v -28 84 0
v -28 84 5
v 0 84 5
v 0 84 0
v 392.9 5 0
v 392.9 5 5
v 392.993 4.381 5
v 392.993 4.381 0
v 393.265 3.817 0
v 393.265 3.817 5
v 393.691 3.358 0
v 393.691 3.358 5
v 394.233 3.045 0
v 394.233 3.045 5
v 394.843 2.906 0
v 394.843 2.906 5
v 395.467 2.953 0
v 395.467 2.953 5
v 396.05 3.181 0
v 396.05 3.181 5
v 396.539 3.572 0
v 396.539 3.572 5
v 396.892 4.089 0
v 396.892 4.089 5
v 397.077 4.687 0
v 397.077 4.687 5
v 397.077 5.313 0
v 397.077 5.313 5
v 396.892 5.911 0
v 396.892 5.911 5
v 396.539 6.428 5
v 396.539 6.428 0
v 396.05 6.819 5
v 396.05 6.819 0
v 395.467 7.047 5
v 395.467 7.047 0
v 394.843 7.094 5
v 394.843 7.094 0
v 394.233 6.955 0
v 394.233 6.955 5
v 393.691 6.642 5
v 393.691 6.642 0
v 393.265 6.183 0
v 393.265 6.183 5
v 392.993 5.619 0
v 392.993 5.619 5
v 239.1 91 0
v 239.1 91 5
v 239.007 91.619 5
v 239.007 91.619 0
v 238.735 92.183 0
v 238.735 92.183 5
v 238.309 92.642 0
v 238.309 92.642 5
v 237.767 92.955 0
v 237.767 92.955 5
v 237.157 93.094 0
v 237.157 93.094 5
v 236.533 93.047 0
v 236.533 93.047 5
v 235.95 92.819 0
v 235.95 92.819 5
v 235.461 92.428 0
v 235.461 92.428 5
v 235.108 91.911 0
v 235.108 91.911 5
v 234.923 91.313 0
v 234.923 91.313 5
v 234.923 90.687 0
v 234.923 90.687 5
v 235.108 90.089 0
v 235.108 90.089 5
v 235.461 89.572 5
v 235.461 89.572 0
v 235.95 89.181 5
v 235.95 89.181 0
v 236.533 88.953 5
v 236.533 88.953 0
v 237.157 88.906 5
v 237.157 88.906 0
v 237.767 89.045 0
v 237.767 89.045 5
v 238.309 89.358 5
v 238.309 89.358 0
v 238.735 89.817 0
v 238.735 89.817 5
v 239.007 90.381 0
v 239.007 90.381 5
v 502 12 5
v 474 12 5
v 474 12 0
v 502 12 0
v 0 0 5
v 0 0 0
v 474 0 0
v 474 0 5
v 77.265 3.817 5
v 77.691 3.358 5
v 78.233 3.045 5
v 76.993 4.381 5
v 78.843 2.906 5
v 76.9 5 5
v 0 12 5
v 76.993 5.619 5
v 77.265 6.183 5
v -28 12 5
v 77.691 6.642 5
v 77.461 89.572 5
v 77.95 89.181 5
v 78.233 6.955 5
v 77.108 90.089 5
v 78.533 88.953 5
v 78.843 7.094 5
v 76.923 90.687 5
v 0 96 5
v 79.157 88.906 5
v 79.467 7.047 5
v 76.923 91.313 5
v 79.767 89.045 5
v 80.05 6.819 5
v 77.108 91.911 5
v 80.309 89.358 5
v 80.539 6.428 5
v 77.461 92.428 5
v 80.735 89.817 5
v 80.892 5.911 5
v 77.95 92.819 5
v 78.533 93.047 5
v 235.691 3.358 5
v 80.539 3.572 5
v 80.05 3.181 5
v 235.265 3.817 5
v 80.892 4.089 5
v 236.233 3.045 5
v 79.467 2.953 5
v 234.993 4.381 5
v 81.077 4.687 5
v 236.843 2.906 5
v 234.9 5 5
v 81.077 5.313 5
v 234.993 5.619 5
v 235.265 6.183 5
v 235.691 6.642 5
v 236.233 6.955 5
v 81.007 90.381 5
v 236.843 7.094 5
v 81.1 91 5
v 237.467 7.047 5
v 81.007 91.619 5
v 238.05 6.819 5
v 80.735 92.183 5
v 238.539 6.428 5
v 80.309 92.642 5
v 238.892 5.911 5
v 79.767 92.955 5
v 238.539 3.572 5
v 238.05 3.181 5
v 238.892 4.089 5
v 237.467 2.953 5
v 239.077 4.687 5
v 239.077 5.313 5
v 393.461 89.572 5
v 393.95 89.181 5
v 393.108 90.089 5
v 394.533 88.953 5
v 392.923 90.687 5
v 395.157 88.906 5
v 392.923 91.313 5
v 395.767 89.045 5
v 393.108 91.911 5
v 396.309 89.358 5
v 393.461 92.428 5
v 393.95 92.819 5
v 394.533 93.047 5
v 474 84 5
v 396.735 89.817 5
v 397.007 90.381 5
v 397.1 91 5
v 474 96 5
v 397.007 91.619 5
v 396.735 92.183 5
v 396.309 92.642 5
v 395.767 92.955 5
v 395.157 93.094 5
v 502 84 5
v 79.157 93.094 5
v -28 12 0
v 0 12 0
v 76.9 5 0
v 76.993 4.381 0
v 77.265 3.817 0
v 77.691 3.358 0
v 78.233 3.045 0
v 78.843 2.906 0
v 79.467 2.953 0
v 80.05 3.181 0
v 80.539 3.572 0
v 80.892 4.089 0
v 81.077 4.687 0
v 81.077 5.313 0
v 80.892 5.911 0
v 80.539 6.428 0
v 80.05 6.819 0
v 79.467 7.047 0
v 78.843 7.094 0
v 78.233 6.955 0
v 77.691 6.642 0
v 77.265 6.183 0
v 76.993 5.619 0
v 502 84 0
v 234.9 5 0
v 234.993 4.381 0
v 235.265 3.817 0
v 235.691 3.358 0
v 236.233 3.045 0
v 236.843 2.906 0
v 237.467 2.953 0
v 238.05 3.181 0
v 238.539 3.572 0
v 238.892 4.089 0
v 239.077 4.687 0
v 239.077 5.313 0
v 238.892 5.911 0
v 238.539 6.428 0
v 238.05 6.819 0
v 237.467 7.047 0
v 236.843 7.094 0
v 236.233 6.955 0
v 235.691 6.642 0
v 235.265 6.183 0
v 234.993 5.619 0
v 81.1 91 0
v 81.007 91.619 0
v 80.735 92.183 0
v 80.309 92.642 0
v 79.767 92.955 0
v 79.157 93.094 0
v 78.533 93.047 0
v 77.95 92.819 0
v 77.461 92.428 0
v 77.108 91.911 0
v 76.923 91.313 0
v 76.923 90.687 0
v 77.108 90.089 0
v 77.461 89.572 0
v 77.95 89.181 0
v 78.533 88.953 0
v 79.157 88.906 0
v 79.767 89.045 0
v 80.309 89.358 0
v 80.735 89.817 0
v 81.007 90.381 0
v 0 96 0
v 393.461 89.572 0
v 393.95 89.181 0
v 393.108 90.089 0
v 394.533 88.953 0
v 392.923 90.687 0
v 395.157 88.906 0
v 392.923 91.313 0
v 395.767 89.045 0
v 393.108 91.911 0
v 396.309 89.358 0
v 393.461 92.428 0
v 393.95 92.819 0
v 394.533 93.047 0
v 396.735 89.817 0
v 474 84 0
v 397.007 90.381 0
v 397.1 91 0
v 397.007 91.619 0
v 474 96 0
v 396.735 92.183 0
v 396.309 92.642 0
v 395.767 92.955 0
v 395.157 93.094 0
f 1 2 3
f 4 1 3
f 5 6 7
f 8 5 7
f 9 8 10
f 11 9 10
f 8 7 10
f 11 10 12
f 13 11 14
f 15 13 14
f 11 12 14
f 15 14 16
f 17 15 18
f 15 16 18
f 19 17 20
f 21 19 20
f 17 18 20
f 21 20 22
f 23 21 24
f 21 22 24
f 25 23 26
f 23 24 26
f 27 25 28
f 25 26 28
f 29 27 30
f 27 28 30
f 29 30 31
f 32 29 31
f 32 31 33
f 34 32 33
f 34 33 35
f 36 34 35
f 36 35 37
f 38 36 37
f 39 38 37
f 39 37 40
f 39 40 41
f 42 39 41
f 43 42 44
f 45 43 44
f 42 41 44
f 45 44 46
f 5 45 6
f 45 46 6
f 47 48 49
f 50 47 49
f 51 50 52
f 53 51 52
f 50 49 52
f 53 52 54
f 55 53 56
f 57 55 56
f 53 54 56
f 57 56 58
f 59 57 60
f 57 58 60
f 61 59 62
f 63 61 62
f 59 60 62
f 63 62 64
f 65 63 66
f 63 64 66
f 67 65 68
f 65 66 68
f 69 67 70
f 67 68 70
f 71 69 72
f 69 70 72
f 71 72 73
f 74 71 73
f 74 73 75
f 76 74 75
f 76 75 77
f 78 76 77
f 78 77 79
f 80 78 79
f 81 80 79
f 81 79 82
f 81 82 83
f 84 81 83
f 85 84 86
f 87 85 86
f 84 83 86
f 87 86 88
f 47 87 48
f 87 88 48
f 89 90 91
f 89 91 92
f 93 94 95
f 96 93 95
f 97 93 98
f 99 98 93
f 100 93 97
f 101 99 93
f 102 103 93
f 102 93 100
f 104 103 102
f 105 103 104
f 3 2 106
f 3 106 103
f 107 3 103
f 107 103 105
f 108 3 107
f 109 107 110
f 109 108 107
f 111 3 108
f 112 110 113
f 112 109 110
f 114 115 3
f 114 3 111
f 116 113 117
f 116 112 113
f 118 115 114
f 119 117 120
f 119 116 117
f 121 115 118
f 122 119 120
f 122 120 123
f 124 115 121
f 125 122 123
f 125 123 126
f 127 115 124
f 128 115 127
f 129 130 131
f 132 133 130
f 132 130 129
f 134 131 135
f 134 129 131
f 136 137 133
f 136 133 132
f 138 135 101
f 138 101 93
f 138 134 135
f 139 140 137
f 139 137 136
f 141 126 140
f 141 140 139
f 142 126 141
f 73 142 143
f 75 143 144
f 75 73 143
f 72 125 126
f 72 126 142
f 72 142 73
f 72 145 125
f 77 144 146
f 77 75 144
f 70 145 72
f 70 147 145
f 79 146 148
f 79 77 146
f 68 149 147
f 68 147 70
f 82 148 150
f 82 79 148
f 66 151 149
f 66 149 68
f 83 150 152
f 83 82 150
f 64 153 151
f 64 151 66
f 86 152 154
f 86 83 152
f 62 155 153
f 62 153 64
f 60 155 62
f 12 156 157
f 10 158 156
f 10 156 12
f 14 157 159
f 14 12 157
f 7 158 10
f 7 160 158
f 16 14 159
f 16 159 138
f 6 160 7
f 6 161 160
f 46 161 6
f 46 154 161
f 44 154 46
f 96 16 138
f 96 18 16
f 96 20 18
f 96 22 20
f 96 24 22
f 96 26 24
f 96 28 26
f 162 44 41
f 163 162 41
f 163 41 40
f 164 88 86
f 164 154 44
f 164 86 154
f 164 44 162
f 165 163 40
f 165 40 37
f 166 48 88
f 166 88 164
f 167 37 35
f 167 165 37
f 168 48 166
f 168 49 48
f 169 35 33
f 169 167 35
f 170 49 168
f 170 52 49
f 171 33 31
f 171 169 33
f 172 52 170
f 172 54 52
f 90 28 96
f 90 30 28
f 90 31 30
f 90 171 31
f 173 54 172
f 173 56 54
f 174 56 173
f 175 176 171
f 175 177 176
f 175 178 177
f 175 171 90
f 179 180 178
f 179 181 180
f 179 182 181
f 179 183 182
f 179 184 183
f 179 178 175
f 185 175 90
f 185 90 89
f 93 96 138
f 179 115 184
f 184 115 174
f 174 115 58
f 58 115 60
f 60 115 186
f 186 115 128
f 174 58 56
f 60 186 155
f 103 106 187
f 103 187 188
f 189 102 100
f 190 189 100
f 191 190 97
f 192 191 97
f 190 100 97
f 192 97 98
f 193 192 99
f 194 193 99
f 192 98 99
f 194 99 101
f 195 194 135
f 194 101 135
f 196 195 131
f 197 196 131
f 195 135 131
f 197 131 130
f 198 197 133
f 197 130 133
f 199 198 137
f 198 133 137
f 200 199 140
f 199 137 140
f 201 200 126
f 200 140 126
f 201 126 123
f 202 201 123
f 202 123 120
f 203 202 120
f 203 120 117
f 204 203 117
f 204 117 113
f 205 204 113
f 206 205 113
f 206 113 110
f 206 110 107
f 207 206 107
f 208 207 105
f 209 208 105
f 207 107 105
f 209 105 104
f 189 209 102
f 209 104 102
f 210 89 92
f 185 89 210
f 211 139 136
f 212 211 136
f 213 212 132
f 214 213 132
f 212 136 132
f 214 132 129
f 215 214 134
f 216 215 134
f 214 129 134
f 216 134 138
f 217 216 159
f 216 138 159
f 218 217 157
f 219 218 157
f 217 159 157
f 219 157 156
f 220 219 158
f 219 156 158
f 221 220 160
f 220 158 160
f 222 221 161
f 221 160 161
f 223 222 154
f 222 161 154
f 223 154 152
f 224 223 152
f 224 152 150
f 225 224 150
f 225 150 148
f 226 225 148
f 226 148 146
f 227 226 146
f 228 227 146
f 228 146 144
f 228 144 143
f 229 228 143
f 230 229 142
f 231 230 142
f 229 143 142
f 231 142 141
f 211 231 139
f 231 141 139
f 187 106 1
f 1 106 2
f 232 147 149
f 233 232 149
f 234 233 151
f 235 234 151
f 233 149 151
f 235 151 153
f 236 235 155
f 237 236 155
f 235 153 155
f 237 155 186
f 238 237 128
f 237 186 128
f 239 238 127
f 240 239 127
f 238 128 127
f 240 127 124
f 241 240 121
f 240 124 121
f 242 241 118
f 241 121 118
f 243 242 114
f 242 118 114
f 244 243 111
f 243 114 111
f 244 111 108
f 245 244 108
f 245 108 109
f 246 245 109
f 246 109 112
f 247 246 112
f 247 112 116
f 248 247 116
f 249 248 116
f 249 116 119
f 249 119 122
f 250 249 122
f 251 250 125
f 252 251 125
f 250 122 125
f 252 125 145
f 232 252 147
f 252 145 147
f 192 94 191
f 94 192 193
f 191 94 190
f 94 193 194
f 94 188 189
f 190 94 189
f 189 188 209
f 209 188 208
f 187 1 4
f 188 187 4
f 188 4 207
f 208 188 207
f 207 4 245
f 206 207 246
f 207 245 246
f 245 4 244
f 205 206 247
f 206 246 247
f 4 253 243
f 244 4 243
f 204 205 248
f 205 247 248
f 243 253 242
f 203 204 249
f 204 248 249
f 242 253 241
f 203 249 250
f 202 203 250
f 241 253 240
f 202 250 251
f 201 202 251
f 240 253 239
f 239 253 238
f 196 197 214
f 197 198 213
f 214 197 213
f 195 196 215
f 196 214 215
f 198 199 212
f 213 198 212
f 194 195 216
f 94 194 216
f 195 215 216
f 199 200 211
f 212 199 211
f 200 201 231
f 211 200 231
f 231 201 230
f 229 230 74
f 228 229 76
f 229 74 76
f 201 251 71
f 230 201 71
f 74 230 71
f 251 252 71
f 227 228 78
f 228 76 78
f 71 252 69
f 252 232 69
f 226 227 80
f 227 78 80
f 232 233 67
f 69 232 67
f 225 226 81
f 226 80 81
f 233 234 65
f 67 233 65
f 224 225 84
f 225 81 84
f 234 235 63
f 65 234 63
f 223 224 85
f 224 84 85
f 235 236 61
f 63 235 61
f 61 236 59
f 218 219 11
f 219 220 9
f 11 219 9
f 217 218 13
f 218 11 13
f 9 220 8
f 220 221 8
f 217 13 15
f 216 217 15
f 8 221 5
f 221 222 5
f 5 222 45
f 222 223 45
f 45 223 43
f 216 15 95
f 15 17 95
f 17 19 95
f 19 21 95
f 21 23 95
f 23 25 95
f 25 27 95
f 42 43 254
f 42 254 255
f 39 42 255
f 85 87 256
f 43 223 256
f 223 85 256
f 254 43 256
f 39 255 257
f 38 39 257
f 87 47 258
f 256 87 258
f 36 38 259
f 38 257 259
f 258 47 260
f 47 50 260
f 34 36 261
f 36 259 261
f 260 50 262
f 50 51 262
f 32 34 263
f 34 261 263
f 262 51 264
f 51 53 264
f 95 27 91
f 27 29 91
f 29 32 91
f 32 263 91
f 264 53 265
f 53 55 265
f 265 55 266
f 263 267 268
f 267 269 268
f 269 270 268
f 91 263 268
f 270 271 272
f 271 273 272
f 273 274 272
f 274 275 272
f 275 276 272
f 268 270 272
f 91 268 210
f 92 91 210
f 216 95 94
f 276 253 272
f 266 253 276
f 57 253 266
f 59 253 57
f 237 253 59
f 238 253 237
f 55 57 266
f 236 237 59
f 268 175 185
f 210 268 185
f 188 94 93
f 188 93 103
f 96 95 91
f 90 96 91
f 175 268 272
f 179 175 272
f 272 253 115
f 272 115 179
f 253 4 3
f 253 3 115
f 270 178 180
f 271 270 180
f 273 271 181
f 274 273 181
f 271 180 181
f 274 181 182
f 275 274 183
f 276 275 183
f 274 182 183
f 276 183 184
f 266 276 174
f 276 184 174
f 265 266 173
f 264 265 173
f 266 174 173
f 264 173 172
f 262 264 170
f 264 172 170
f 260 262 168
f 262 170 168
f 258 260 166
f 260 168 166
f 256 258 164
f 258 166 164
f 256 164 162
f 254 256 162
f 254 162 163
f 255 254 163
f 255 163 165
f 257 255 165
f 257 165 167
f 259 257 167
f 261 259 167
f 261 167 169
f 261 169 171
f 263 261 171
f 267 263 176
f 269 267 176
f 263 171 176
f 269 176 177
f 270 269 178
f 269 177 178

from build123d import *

# Parameters (mm, degrees)
SKETCH1_W           = 474
SKETCH1_H           = 96
BOSS_EXTRUDE1_DEPTH = 5
SKETCH2_R           = 2.1
CUT_EXTRUDE1_DEPTH  = 5
SKETCH3_W           = 28
SKETCH3_H           = 72
BOSS_EXTRUDE2_DEPTH = 5


with BuildPart() as part:
    # Sketch1 → Boss-Extrude1 (new body)
    with BuildSketch(Plane.XY):
        with Locations((237, 48)):
            Rectangle(SKETCH1_W, SKETCH1_H)
    extrude(amount=BOSS_EXTRUDE1_DEPTH)

    # Sketch2 → Cut-Extrude1 (cut)
    with BuildSketch(Plane.XY.offset(5)):
        with Locations((79, 91)):
            Circle(SKETCH2_R)
        with Locations((237, 91)):
            Circle(SKETCH2_R)
        with Locations((395, 91)):
            Circle(SKETCH2_R)
        with Locations(Location((395, 5, 0), (0, 0, 180))):
            Circle(SKETCH2_R)
        with Locations(Location((237, 5, 0), (0, 0, 180))):
            Circle(SKETCH2_R)
        with Locations(Location((79, 5, 0), (0, 0, 180))):
            Circle(SKETCH2_R)
    extrude(amount=-CUT_EXTRUDE1_DEPTH, mode=Mode.SUBTRACT)

    # Sketch3 → Boss-Extrude2 (add)
    with BuildSketch(Plane.XY.offset(5)):
        with Locations((488, 48)):
            Rectangle(SKETCH3_W, SKETCH3_H)
        with Locations((-14, 48)):
            Rectangle(SKETCH3_W, SKETCH3_H)
    extrude(amount=-BOSS_EXTRUDE2_DEPTH)


solid = part.part
